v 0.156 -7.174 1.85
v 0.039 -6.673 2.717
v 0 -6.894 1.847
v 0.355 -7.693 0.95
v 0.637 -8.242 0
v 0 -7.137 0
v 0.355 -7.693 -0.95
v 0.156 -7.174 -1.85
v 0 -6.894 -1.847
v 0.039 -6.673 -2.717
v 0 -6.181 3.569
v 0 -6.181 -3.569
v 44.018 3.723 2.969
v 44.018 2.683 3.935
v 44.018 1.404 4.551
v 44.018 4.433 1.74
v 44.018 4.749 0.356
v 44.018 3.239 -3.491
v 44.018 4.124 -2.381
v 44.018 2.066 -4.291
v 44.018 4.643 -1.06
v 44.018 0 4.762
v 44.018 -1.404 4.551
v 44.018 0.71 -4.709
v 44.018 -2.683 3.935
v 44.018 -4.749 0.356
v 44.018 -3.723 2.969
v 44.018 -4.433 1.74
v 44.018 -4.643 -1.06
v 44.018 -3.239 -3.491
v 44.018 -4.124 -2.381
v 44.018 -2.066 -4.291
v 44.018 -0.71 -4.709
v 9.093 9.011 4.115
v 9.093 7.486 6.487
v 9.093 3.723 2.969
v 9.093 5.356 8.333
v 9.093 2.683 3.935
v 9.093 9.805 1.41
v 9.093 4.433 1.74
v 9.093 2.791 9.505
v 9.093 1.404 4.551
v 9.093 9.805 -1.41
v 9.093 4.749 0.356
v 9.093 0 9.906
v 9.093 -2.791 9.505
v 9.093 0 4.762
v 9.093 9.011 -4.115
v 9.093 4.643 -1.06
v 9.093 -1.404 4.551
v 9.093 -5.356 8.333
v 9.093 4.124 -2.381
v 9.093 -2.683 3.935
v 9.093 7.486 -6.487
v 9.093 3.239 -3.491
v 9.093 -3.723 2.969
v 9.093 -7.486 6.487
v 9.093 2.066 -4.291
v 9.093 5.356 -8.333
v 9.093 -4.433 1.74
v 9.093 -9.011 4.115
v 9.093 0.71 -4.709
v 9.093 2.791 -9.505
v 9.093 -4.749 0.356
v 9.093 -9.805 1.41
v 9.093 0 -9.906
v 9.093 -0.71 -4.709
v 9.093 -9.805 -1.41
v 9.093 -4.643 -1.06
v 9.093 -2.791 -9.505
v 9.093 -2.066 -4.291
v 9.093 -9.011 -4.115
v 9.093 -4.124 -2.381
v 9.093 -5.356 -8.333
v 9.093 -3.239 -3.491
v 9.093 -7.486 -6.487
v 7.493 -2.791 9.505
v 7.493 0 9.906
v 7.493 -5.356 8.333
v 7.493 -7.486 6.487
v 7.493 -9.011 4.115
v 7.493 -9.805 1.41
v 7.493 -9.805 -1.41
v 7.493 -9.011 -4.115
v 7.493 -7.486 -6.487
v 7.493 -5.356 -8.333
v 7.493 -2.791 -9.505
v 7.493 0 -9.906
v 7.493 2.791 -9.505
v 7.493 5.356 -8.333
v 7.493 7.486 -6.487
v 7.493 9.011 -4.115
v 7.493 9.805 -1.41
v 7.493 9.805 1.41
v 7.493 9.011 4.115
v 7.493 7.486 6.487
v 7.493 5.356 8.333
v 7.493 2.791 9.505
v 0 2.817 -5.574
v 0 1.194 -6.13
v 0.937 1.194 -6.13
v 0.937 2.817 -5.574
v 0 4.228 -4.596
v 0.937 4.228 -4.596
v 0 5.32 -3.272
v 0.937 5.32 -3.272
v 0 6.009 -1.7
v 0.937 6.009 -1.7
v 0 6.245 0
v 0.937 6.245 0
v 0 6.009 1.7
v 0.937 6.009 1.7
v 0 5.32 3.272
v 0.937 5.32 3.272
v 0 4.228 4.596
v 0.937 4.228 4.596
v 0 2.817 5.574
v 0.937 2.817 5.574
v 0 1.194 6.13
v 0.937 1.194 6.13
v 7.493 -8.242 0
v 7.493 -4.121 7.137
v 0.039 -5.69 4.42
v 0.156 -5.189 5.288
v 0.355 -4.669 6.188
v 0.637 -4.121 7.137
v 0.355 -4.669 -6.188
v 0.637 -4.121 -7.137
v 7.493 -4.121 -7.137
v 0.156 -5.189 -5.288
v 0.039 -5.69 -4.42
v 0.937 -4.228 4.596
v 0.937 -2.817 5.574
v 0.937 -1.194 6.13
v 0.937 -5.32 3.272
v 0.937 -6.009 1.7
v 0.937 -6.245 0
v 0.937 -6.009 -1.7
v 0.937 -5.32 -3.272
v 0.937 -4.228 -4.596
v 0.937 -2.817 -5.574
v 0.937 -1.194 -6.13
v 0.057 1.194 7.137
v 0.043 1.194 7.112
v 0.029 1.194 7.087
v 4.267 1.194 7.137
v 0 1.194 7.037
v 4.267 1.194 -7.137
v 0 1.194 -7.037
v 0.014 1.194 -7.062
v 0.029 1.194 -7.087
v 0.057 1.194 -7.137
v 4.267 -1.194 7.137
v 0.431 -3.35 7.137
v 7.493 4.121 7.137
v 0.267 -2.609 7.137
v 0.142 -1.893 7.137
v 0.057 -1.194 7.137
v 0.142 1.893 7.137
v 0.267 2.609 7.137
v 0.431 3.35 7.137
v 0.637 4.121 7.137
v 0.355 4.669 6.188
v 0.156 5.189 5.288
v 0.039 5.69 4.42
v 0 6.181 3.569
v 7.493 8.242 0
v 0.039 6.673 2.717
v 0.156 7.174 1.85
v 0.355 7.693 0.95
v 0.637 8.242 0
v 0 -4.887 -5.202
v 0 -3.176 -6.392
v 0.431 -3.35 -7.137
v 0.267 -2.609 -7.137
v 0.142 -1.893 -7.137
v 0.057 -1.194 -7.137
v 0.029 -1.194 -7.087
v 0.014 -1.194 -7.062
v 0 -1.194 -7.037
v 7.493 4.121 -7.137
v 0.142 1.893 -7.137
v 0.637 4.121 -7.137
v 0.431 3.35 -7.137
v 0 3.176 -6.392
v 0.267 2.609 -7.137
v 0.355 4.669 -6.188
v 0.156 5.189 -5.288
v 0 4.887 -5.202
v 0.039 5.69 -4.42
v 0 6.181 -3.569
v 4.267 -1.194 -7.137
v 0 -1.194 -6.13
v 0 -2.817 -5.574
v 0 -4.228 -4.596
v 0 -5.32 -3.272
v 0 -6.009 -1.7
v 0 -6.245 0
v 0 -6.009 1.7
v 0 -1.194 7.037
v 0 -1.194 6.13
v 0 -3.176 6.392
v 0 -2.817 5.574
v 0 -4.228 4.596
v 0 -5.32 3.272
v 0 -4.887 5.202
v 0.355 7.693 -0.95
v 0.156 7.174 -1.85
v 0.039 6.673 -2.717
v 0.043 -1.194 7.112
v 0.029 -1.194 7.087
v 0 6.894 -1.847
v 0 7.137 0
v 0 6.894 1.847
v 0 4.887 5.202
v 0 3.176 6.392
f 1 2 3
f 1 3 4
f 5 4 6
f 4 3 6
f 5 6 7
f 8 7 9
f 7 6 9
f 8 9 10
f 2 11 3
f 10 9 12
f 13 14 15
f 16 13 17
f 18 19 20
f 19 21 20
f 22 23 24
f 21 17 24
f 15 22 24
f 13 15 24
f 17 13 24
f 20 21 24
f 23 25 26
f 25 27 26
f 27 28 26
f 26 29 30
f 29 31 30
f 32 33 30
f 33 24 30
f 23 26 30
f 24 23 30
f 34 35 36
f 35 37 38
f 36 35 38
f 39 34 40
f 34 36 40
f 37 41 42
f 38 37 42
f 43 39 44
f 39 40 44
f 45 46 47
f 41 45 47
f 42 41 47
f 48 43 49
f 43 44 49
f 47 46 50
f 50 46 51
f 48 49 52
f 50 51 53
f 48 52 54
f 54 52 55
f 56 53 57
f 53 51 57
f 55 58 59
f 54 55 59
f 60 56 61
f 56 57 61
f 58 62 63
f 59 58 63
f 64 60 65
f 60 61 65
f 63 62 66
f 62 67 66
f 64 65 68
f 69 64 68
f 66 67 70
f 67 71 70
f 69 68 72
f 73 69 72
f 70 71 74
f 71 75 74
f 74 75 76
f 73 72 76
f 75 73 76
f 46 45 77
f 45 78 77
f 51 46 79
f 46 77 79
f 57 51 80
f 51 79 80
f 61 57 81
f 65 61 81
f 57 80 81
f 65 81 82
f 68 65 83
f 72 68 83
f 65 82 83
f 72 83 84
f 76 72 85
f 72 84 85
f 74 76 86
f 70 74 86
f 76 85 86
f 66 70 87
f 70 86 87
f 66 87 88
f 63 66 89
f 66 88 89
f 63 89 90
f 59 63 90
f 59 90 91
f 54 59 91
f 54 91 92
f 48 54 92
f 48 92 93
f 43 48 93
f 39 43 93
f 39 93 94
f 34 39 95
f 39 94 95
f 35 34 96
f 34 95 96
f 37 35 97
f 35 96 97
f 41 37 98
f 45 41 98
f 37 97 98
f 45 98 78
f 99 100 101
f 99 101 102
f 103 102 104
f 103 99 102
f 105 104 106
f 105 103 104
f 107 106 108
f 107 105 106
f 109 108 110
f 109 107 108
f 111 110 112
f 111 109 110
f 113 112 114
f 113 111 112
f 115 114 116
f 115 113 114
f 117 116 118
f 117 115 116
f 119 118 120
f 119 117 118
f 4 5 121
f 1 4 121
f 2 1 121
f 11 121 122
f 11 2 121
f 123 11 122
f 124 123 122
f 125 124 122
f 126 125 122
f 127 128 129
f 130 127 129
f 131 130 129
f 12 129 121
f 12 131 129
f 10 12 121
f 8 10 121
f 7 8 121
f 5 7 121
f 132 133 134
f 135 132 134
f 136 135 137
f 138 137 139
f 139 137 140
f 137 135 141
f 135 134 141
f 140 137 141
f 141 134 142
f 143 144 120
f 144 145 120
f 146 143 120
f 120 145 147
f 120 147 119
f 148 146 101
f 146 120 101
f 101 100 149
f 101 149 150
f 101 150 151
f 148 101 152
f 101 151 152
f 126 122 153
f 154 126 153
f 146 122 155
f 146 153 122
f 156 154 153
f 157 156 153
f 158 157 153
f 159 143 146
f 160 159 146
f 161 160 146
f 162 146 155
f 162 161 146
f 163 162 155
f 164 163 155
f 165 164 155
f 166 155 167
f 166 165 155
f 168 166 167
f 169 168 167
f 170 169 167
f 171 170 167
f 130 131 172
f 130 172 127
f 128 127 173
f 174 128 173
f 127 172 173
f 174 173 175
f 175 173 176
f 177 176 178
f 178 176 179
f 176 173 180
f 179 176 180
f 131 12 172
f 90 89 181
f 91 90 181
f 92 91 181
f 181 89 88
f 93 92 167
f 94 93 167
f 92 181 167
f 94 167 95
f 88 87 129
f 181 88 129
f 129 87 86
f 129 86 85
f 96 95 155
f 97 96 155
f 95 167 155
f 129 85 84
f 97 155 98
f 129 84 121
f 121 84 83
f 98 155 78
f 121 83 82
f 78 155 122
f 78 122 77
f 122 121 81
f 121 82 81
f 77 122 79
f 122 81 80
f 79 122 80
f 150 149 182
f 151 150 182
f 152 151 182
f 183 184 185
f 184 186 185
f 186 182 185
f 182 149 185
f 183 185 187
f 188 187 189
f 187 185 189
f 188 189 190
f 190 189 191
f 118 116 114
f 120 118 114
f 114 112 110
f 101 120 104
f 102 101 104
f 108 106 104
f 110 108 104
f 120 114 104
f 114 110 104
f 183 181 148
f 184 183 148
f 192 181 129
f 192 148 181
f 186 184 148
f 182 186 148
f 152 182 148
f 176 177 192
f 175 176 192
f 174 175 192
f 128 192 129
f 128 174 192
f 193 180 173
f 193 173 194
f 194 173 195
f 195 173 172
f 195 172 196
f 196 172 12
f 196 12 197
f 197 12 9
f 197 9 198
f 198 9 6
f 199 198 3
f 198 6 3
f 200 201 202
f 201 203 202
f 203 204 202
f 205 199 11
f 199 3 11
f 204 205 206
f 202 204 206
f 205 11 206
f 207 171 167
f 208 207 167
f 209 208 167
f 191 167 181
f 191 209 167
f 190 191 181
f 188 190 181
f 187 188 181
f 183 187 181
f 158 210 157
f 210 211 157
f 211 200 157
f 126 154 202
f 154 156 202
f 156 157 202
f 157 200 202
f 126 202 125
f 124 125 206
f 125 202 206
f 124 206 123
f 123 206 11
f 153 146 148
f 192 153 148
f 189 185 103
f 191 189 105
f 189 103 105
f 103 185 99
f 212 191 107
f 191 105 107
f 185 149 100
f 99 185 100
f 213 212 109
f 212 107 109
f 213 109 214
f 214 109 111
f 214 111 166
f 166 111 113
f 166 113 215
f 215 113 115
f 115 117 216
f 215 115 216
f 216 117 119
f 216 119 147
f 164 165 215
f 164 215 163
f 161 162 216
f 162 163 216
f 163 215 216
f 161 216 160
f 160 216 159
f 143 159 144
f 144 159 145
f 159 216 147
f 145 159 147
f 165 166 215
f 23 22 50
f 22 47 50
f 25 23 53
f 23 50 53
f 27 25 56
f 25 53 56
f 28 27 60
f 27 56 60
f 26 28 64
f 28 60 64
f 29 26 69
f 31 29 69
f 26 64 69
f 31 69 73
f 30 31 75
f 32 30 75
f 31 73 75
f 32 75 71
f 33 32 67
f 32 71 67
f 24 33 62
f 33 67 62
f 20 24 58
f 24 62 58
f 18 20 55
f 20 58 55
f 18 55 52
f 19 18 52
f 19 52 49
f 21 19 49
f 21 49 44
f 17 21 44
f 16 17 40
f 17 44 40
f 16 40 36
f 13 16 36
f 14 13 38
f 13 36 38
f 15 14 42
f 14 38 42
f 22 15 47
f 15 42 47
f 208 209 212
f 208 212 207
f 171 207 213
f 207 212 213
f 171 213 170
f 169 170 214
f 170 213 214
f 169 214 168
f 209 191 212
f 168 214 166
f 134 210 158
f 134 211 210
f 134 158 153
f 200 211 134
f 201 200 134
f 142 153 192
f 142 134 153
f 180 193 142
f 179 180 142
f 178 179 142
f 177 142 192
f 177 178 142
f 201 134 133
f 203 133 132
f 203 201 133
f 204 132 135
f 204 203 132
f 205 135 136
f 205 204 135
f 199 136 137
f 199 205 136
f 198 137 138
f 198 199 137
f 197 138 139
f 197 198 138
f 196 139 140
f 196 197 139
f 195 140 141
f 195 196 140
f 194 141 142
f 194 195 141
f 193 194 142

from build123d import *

# Parameters (mm, degrees)
HEX_DIE_START = -2e-06
SKETCH2_R     = 10.00506
HEX_DIE_DEPTH = 7.493002
SKETCH3_W     = 16.483602772
SKETCH3_H     = 2.3876
SLOT_DEPTH    = 4.2672
SKETCH4_R     = 6.245225
INDENT_DEPTH  = 0.936625


with BuildPart() as part:
    # BodySke → Base-Revolve (revolve)
    with BuildSketch(Plane.XY, mode=Mode.PRIVATE) as base_revolve_sk:
        Polygon((9.0932, 4.7625), (9.0932, 9.906), (7.493, 9.906), (7.493, 8.241801386), (0.637626437, 8.241801386), (0, 7.1374), (0, 0), (44.0182, 0), (44.0182, 4.7625), align=None)
    revolve(base_revolve_sk.sketch.rotate(Axis((-25.4, 0, 0), (1, 0, 0)), 90), axis=Axis((-25.4, 0, 0), (1, 0, 0)))

    # Sketch2 → Hex-Die (cut)
    with BuildSketch(Plane(origin=(0, 0, 0), x_dir=(0, 0, -1), z_dir=(1, 0, 0)).offset(HEX_DIE_START)):
        Circle(SKETCH2_R)
        Polygon((-7.1374, 4.120779829), (0, 8.241559659), (7.1374, 4.120779829), (7.1374, -4.120779829), (0, -8.241559659), (-7.1374, -4.120779829), align=None, mode=Mode.SUBTRACT)
    extrude(amount=HEX_DIE_DEPTH, mode=Mode.SUBTRACT)

    # Sketch3 → Slot (cut)
    with BuildSketch(Plane(origin=(0, 0, 0), x_dir=(0, 0, -1), z_dir=(1, 0, 0))):
        Rectangle(SKETCH3_W, SKETCH3_H)
    extrude(amount=SLOT_DEPTH, mode=Mode.SUBTRACT)

    # Sketch4 → Indent (cut)
    with BuildSketch(Plane(origin=(0, 0, 0), x_dir=(0, 0, -1), z_dir=(1, 0, 0))):
        Circle(SKETCH4_R)
    extrude(amount=INDENT_DEPTH, mode=Mode.SUBTRACT)


solid = part.part
